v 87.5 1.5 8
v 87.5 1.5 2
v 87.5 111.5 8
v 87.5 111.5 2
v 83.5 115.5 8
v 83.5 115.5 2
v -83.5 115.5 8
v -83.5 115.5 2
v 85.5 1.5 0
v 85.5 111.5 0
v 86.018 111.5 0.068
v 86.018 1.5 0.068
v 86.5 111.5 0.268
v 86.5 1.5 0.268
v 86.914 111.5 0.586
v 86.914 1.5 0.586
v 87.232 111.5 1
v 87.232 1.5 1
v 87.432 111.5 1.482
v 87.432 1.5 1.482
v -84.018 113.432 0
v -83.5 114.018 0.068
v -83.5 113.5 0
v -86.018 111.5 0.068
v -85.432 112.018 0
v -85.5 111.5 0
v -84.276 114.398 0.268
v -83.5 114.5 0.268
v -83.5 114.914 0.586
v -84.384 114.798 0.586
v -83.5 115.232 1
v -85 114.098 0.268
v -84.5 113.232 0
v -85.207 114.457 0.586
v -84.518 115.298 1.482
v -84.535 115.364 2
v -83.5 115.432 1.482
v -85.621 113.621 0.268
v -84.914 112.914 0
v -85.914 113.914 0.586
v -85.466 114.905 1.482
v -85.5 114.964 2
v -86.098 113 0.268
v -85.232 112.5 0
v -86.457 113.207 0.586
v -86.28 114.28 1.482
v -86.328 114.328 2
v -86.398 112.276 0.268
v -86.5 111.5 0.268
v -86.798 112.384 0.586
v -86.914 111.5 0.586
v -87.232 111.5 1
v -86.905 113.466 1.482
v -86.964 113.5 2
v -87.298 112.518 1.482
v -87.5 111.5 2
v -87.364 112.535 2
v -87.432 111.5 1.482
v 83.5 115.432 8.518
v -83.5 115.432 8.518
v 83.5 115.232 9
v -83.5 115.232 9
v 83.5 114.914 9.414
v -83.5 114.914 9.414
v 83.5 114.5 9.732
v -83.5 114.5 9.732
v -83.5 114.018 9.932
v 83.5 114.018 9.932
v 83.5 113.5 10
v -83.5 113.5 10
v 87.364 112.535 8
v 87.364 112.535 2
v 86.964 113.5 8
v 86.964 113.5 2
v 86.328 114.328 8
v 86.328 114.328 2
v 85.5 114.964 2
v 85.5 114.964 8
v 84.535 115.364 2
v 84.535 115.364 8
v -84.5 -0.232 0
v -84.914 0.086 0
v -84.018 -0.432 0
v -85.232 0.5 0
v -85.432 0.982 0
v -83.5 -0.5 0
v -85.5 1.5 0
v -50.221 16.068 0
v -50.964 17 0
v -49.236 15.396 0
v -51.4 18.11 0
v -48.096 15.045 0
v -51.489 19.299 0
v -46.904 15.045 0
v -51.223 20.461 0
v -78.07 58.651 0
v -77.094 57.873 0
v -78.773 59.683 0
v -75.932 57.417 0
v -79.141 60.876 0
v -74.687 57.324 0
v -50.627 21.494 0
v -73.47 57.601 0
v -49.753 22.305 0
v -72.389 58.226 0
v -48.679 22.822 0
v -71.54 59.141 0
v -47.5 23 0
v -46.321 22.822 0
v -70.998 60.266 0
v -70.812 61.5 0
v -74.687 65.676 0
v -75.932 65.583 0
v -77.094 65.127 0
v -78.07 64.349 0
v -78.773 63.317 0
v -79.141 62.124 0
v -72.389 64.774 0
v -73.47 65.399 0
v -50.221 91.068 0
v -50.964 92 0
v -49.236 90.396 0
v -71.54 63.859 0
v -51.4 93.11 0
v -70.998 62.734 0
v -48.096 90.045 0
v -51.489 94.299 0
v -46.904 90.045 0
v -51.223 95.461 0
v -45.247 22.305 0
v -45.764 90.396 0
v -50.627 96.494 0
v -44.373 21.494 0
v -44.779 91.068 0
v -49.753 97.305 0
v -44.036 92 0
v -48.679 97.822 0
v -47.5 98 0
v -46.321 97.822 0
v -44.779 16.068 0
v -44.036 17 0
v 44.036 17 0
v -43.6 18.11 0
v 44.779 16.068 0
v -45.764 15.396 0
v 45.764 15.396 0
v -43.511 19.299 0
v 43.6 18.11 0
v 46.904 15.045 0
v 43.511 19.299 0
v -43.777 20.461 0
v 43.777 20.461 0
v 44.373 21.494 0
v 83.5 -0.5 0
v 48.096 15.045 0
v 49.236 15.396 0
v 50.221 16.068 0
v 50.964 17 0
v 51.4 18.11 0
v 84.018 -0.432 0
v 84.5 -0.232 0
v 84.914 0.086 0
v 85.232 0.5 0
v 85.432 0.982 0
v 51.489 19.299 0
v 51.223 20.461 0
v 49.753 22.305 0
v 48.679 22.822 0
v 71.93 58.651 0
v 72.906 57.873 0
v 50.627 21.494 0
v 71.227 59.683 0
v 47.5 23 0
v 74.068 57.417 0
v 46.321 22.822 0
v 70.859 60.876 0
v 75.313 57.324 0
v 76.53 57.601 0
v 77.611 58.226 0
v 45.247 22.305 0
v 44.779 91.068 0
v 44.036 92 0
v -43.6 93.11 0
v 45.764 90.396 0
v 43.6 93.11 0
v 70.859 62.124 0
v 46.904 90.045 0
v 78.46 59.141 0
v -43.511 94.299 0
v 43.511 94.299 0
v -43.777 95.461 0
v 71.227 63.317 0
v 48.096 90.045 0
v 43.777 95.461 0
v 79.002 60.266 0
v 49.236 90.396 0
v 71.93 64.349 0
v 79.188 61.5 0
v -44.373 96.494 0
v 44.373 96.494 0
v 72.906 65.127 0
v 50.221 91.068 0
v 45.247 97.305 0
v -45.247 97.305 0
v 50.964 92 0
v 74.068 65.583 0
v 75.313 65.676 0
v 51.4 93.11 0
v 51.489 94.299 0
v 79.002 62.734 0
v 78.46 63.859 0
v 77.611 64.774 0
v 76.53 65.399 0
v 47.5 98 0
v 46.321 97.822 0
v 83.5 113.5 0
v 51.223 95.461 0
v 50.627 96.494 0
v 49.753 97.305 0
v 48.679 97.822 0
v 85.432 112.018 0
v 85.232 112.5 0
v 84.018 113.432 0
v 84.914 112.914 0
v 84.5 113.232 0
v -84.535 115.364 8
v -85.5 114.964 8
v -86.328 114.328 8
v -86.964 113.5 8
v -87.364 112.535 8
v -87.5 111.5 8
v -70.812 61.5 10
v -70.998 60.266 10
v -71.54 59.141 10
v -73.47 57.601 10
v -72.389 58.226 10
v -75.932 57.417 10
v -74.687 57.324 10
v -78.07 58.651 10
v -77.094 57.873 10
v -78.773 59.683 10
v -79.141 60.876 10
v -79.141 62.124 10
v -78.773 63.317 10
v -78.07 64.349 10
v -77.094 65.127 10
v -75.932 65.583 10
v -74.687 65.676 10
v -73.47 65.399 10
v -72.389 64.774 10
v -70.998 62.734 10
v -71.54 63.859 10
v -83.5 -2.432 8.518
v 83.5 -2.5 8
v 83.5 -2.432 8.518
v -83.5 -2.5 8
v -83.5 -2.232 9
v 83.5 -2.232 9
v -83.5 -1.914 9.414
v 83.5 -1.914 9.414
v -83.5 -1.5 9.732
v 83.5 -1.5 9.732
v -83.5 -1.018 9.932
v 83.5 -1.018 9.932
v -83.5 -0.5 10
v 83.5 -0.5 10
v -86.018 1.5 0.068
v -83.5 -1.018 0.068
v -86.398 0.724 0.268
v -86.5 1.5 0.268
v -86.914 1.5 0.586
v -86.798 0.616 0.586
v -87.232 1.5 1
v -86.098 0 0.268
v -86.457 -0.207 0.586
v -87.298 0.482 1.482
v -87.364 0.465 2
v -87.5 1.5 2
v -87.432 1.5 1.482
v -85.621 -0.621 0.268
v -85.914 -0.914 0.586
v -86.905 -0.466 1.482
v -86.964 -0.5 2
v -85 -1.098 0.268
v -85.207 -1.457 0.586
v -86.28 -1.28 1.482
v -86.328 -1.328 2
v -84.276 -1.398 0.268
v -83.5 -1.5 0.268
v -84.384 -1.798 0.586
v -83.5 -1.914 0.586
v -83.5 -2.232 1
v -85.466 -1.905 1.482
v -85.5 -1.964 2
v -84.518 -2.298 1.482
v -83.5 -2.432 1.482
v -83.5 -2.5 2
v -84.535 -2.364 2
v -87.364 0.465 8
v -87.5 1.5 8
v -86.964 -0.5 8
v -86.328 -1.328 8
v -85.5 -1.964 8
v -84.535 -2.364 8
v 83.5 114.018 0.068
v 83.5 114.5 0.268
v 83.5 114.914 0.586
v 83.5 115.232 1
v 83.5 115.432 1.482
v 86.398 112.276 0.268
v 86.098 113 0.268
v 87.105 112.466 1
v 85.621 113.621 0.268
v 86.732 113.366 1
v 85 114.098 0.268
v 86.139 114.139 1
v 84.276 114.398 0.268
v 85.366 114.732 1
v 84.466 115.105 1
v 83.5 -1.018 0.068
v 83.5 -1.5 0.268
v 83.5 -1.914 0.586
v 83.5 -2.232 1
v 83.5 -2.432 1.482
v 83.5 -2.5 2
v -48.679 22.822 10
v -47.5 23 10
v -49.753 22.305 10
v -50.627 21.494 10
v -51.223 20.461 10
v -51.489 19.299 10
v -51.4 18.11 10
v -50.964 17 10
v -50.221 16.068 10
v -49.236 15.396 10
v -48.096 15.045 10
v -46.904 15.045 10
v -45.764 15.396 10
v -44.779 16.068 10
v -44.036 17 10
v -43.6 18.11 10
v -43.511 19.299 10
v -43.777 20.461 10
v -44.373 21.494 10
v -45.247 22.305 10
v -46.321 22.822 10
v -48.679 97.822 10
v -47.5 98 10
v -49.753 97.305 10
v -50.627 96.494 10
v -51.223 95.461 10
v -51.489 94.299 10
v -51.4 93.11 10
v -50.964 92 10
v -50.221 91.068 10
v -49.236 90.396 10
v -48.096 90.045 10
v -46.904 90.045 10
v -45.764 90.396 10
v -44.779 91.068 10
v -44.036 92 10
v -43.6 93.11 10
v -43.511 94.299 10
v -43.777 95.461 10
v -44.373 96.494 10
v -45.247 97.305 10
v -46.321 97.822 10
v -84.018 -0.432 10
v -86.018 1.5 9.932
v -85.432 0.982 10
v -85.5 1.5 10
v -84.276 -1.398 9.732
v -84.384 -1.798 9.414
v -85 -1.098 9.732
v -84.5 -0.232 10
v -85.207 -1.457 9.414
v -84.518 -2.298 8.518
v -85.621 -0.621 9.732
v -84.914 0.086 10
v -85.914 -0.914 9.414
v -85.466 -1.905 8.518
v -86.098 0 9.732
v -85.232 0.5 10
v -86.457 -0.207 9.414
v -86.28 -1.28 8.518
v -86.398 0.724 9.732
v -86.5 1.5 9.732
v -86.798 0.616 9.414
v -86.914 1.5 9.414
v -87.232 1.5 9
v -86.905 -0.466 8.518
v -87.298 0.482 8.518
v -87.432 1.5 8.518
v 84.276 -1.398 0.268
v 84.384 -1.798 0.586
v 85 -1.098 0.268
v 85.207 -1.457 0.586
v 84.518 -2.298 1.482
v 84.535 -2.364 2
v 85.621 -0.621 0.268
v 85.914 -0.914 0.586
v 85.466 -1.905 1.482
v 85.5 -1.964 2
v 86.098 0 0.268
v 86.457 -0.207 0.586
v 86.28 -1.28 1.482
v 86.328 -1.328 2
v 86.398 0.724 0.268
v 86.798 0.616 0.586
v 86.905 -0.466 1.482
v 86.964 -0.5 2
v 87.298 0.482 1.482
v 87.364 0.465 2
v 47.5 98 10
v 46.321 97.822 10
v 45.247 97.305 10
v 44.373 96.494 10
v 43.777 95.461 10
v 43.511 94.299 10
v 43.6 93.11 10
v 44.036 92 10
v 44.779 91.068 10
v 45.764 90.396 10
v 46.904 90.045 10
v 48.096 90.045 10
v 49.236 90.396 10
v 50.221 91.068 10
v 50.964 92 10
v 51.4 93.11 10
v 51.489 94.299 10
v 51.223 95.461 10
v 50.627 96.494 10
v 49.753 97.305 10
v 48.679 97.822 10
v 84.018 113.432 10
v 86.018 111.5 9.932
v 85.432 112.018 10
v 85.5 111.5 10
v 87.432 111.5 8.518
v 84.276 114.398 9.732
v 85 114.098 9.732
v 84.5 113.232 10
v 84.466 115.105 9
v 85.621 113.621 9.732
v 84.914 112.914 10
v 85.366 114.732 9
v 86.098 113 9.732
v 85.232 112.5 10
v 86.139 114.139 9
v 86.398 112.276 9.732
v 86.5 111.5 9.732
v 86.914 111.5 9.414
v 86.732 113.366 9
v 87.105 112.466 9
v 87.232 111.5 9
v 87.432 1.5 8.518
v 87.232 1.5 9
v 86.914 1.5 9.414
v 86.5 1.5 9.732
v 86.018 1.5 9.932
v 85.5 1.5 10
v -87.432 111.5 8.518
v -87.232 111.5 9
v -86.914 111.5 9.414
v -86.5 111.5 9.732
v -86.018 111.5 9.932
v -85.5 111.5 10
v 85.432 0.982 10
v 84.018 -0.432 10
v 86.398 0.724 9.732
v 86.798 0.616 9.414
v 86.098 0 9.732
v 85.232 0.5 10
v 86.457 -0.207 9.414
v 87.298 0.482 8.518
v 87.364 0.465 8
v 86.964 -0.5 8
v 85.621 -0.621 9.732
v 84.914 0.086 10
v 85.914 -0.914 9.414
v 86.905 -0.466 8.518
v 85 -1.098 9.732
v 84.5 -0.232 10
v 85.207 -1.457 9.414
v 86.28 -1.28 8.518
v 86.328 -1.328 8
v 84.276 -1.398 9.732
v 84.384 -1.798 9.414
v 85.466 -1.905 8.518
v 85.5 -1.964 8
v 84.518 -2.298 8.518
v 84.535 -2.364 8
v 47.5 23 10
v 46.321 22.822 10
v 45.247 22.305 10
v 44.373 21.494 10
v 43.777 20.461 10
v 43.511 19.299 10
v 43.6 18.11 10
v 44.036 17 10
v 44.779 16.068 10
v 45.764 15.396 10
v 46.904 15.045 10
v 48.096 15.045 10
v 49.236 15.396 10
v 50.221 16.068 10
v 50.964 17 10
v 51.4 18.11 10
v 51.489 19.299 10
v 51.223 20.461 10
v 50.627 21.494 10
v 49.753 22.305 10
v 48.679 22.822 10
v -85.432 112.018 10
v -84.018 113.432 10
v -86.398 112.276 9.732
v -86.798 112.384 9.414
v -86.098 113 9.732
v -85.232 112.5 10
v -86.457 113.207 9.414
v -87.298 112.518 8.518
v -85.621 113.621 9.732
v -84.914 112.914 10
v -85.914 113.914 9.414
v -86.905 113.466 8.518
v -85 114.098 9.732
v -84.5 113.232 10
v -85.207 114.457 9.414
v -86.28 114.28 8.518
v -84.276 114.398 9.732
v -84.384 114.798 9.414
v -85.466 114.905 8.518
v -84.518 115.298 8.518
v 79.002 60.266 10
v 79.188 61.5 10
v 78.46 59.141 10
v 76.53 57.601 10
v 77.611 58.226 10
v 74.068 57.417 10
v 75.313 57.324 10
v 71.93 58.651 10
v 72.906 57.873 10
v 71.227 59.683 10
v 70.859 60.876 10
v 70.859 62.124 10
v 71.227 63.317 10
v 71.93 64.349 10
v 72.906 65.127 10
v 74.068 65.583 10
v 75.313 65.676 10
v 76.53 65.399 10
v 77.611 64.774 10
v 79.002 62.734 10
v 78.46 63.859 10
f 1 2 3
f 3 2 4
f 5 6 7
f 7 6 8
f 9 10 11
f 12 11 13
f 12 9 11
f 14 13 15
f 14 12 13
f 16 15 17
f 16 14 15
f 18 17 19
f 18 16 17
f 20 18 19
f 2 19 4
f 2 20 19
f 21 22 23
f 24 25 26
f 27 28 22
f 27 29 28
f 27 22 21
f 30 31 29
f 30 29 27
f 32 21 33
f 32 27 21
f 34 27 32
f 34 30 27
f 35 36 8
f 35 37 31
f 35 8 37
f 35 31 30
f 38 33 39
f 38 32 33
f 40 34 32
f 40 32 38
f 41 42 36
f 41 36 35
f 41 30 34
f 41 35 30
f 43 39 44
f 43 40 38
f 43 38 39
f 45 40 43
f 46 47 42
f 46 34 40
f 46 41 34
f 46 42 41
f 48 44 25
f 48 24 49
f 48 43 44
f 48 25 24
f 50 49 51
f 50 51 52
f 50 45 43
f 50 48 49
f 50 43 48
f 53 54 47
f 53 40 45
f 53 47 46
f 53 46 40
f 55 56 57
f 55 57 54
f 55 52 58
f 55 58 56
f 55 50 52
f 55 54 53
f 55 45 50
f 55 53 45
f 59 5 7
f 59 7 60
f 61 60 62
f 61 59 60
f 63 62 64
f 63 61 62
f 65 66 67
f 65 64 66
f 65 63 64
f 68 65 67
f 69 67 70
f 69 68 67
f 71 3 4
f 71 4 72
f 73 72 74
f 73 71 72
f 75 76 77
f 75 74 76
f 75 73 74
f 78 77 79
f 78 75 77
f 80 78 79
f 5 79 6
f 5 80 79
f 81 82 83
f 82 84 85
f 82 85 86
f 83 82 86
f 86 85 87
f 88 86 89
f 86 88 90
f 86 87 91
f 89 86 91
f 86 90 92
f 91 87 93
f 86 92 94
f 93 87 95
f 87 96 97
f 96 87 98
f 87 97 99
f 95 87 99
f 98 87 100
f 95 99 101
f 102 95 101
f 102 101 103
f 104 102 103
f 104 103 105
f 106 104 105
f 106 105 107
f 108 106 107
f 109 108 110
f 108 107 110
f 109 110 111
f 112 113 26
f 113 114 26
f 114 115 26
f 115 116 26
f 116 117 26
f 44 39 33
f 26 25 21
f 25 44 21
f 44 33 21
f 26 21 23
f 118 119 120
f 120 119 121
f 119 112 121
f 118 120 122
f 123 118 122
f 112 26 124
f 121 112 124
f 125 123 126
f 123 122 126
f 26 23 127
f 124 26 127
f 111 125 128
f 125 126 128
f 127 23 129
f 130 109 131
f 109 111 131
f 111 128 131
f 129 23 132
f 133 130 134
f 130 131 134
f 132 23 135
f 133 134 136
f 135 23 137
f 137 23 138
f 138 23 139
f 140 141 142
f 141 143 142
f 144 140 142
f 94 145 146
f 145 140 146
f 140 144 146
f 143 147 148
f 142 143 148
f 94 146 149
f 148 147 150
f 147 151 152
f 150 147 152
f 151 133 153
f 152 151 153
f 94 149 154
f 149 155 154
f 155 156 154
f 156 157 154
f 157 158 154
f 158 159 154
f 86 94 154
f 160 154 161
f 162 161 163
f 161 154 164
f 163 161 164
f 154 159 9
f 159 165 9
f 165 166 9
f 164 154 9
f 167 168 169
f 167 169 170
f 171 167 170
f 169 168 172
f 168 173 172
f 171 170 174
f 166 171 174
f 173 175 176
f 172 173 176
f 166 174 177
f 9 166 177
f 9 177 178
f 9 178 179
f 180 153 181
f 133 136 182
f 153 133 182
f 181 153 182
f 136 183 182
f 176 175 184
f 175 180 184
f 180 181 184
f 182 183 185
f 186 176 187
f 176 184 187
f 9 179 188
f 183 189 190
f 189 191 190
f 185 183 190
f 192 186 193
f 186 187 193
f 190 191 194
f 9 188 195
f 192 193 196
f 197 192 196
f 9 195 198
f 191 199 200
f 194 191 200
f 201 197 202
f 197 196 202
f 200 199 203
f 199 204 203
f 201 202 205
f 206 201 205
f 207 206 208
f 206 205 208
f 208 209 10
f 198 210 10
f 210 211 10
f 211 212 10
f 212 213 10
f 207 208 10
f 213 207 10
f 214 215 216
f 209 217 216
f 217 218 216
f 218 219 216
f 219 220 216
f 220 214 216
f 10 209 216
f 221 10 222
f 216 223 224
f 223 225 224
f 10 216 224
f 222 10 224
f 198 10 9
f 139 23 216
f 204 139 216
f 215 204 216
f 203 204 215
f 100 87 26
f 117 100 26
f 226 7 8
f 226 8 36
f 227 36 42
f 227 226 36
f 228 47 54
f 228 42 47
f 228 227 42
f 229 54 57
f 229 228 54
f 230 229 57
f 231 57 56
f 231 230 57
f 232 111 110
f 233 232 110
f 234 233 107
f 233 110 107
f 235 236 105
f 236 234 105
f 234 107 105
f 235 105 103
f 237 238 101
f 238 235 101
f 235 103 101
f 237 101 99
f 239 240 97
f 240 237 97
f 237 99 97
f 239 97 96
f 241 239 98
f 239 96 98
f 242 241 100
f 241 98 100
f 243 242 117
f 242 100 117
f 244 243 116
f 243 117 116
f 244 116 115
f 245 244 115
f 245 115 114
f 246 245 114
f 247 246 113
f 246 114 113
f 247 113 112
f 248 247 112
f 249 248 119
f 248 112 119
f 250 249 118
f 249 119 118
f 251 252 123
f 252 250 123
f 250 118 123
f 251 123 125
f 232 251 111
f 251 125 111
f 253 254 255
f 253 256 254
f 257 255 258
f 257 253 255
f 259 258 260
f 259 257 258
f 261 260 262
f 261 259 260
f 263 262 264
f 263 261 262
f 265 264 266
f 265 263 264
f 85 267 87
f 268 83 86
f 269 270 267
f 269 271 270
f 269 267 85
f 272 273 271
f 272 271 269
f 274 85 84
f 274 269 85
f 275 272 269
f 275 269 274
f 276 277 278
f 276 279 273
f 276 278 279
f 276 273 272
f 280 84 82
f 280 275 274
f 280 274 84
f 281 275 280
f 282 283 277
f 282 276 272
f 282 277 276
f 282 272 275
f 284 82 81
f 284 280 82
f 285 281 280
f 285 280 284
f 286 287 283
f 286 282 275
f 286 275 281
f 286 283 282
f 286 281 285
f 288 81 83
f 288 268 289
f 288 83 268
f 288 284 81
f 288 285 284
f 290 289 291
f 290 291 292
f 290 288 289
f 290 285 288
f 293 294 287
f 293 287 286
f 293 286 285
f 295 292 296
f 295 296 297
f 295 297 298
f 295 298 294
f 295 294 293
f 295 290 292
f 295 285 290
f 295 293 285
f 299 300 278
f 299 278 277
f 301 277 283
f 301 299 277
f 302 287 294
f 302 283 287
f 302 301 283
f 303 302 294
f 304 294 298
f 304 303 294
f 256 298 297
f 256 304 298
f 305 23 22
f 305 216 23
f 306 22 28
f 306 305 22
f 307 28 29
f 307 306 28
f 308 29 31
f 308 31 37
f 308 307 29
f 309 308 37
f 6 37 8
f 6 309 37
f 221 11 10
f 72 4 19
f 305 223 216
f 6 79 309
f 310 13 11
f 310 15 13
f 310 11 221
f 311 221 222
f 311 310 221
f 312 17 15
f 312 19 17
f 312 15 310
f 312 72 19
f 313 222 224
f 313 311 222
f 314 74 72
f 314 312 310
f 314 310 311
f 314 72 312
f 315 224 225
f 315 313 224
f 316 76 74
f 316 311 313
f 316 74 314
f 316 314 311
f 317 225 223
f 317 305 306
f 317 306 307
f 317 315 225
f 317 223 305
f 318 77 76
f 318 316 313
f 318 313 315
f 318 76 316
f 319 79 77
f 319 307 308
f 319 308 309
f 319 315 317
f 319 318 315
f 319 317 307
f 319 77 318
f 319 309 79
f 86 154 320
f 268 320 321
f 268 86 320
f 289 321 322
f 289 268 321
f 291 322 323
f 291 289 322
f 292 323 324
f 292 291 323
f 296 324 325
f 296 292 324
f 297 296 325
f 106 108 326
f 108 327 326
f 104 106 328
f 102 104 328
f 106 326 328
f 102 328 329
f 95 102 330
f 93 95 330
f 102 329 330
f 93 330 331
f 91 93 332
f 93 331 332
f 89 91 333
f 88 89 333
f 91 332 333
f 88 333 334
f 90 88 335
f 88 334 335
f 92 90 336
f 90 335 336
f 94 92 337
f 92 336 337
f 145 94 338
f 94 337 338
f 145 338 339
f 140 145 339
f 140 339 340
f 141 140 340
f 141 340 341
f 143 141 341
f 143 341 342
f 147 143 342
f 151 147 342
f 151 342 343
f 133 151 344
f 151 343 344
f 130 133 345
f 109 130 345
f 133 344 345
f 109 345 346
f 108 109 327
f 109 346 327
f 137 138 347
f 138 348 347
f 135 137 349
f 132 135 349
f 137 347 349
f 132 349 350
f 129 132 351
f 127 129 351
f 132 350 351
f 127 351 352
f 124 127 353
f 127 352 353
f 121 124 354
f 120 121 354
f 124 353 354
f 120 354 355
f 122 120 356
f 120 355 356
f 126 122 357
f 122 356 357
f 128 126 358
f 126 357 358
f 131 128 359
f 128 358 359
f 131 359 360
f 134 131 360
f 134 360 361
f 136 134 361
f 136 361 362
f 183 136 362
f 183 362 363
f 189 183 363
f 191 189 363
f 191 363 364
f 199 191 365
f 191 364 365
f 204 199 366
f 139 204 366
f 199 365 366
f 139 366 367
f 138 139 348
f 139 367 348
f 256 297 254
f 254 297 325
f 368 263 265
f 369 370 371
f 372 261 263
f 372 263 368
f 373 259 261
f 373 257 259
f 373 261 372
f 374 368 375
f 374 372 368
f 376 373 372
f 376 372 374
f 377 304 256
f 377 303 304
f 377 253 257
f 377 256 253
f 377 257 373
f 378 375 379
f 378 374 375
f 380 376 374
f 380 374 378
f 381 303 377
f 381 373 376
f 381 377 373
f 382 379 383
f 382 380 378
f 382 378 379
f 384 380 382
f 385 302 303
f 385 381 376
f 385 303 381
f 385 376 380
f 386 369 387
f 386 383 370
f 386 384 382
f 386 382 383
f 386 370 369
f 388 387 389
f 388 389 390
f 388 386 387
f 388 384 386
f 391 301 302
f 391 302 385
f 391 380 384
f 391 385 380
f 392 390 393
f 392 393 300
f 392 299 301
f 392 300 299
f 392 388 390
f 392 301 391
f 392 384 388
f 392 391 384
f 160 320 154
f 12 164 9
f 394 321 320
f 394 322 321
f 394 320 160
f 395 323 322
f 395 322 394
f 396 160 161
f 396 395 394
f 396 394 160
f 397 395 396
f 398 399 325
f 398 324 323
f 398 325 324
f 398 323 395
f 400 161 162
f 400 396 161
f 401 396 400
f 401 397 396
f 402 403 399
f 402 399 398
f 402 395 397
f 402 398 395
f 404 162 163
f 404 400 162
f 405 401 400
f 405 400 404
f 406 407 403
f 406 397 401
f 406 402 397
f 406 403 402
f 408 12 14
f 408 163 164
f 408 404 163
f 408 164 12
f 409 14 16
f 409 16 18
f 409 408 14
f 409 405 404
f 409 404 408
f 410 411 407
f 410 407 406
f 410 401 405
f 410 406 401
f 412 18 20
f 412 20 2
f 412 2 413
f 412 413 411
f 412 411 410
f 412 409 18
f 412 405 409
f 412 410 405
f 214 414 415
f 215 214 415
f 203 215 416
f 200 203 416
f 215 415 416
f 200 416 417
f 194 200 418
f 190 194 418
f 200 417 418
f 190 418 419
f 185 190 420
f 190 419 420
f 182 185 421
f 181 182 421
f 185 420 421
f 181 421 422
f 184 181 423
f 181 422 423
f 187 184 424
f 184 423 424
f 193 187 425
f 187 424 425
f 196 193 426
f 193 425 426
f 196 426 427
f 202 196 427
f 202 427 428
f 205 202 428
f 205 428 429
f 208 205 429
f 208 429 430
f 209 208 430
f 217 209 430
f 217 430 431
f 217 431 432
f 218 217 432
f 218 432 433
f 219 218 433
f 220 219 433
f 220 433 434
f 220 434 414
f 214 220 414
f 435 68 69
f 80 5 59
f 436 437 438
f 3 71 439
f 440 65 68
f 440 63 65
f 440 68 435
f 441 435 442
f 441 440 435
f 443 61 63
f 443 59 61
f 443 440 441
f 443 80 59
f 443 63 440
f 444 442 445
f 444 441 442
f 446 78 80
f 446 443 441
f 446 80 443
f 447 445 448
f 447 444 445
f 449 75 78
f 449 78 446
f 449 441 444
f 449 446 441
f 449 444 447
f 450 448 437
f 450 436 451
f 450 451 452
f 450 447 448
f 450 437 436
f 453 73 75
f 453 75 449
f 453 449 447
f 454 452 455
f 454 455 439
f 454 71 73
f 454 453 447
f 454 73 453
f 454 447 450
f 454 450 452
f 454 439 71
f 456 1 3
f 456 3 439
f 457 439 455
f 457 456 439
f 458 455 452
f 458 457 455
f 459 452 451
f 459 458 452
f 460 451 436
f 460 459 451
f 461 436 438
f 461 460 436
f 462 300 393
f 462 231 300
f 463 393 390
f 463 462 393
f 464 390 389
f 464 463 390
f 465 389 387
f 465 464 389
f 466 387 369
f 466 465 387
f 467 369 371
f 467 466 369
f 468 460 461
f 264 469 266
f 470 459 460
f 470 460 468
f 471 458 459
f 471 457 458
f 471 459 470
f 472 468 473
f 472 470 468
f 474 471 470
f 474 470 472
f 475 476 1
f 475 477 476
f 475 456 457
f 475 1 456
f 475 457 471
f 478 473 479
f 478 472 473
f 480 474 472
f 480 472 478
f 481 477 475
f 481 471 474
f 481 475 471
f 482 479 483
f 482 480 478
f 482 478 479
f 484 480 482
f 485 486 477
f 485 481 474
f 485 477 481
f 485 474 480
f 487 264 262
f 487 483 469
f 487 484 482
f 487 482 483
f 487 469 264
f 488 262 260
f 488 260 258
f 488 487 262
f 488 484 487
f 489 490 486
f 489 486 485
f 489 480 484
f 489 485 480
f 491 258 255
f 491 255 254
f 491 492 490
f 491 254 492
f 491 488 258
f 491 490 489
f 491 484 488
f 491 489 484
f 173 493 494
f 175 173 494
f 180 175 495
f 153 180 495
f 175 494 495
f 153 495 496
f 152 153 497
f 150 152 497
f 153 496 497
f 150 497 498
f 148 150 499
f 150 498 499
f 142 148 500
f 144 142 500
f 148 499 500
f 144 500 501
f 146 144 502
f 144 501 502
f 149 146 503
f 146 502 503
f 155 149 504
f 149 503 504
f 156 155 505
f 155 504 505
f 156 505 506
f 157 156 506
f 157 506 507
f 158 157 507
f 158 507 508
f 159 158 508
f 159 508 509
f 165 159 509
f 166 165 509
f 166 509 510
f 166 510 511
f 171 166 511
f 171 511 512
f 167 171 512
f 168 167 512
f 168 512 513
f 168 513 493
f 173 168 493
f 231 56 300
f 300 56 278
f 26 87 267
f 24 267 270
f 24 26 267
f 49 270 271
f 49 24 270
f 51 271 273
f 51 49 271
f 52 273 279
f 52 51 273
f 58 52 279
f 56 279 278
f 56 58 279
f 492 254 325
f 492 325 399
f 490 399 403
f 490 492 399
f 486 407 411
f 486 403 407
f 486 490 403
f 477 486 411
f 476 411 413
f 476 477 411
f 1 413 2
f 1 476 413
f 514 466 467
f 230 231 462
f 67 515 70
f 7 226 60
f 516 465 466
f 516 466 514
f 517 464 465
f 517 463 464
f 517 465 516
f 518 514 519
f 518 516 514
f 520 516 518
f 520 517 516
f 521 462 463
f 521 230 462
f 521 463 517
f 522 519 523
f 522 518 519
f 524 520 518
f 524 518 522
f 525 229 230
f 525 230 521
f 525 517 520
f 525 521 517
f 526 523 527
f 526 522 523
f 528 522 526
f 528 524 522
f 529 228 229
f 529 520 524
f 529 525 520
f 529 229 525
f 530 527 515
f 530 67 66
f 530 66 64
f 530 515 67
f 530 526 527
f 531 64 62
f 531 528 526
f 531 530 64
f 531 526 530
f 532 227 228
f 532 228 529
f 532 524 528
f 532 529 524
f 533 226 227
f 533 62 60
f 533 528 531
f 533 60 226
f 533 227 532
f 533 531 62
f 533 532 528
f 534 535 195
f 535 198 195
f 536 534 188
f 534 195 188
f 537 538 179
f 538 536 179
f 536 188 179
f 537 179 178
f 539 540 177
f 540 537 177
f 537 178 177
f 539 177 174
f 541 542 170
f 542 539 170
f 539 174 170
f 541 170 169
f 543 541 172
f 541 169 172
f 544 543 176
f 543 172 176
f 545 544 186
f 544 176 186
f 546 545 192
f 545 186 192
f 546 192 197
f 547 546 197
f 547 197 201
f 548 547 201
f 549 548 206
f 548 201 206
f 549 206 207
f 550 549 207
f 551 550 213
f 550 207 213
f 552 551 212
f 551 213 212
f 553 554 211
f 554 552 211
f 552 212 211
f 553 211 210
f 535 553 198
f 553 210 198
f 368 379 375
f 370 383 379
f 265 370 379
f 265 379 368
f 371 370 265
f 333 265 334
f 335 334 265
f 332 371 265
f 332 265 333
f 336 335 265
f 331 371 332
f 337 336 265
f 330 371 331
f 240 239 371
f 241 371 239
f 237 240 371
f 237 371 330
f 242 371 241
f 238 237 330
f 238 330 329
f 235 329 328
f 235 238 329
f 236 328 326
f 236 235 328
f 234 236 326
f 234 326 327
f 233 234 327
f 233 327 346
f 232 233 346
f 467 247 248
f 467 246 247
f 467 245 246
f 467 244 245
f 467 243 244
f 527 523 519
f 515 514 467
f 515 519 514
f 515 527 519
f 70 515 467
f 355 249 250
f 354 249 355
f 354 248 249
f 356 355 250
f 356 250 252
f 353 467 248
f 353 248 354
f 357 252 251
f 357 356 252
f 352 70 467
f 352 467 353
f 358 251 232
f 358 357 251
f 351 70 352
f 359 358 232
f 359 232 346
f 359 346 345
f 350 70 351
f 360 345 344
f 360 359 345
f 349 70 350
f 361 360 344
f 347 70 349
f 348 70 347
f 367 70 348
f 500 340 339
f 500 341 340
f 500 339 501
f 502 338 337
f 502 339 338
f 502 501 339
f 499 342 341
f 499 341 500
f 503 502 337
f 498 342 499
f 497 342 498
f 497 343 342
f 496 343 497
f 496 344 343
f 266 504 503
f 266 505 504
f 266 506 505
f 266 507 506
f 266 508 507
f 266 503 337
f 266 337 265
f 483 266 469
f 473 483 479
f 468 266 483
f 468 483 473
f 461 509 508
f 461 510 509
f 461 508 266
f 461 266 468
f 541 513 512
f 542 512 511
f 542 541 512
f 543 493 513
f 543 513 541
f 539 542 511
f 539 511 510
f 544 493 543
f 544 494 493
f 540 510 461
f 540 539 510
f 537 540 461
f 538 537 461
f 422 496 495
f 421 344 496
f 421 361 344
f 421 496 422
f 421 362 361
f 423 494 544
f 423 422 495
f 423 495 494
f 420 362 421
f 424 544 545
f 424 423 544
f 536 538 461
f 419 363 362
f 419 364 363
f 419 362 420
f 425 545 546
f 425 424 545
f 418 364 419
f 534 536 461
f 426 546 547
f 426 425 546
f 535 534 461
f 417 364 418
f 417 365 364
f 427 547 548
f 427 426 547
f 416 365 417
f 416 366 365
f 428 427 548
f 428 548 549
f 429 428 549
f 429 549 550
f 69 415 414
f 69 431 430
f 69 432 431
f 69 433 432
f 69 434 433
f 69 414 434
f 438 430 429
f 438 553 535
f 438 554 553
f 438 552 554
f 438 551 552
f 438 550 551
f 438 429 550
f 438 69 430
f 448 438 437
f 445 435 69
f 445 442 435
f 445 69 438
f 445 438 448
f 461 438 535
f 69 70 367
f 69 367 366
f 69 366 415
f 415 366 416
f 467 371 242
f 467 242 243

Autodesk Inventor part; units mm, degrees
ref_plane "YZ Plane" through (0, 0, 0) normal (1, 0, 0) x (0, 1, 0)
ref_plane "XZ Plane" through (0, 0, 0) normal (0, 1, 0) x (-1, 0, 0)
ref_plane "XY Plane" through (0, 0, 0) normal (0, 0, 1) x (1, 0, 0)
sketch "Sketch1" plane through (0, 0, 0) normal (0, 0, 1) x (1, 0, 0)
  circle A0 centre (75, 150.5) radius 4.1881 projected
  circle A1 centre (75, 61.5) radius 4.1881 projected
  circle A2 centre (-75, 61.5) radius 4.1881 projected
  circle A3 centre (-75, 150.5) radius 4.1881 projected
  line L0 (-87.5, -2.5) -> (87.5, -2.5)
  line L1 (87.5, -2.5) -> (87.5, 115.5)
  line L2 (87.5, 115.5) -> (-87.5, 115.5)
  line L3 (-87.5, 115.5) -> (-87.5, -2.5)
  line L4 (-87.5, -2.5) -> (87.5, 115.5) construction
  line L5 (87.5, -2.5) -> (-87.5, 115.5) construction
  line L6 (47.5, 94) -> (-47.5, 94) construction
  line L7 (-47.5, 94) -> (-47.5, 19) construction
  line L8 (-47.5, 19) -> (47.5, 19) construction
  line L9 (47.5, 19) -> (47.5, 94) construction
  line L10 (47.5, 94) -> (-47.5, 19) construction
  line L11 (-47.5, 94) -> (47.5, 19) construction
  line L12 (75, 61.5) -> (-75, 61.5) construction
  line L13 (0, 61.5) -> (0, 56.5) construction
  point P0 (0, 0)
  dimension "d0" = 175
  dimension "d1" = 118
  dimension "d2" = 95
  dimension "d3" = 75
  dimension "d15" = 5
extrude "Extrusion1" add sketch "Sketch1" along normal blind 10 contours L3 L2 L1 L0
hole "Hole1" at (47.5, 94, 0) at (47.5, 19, 0) at (-47.5, 19, 0) at (-47.5, 94, 0) direction (0, 0, 1) diameter 8 depth 15
fillet "Fillet1" radius 4 4 edges at (87.5, 115.5, 5) (87.5, -2.5, 5) (-87.5, -2.5, 5) (-87.5, 115.5, 5)
fillet "Fillet2" radius 2 16 edges at (86.3284, 114.3284, 0) (0, 115.5, 0) (-86.3284, 114.3284, 0) (-87.5, 56.5, 0) (-86.3284, -1.3284, 0) (0, -2.5, 0) (86.3284, -1.3284, 0) (87.5, 56.5, 0) (86.3284, 114.3284, 10) (0, 115.5, 10) (-86.3284, 114.3284, 10) (-87.5, 56.5, 10) (-86.3284, -1.3284, 10) (0, -2.5, 10) (86.3284, -1.3284, 10) (87.5, 56.5, 10)
properties part number "CylinderSupport"
